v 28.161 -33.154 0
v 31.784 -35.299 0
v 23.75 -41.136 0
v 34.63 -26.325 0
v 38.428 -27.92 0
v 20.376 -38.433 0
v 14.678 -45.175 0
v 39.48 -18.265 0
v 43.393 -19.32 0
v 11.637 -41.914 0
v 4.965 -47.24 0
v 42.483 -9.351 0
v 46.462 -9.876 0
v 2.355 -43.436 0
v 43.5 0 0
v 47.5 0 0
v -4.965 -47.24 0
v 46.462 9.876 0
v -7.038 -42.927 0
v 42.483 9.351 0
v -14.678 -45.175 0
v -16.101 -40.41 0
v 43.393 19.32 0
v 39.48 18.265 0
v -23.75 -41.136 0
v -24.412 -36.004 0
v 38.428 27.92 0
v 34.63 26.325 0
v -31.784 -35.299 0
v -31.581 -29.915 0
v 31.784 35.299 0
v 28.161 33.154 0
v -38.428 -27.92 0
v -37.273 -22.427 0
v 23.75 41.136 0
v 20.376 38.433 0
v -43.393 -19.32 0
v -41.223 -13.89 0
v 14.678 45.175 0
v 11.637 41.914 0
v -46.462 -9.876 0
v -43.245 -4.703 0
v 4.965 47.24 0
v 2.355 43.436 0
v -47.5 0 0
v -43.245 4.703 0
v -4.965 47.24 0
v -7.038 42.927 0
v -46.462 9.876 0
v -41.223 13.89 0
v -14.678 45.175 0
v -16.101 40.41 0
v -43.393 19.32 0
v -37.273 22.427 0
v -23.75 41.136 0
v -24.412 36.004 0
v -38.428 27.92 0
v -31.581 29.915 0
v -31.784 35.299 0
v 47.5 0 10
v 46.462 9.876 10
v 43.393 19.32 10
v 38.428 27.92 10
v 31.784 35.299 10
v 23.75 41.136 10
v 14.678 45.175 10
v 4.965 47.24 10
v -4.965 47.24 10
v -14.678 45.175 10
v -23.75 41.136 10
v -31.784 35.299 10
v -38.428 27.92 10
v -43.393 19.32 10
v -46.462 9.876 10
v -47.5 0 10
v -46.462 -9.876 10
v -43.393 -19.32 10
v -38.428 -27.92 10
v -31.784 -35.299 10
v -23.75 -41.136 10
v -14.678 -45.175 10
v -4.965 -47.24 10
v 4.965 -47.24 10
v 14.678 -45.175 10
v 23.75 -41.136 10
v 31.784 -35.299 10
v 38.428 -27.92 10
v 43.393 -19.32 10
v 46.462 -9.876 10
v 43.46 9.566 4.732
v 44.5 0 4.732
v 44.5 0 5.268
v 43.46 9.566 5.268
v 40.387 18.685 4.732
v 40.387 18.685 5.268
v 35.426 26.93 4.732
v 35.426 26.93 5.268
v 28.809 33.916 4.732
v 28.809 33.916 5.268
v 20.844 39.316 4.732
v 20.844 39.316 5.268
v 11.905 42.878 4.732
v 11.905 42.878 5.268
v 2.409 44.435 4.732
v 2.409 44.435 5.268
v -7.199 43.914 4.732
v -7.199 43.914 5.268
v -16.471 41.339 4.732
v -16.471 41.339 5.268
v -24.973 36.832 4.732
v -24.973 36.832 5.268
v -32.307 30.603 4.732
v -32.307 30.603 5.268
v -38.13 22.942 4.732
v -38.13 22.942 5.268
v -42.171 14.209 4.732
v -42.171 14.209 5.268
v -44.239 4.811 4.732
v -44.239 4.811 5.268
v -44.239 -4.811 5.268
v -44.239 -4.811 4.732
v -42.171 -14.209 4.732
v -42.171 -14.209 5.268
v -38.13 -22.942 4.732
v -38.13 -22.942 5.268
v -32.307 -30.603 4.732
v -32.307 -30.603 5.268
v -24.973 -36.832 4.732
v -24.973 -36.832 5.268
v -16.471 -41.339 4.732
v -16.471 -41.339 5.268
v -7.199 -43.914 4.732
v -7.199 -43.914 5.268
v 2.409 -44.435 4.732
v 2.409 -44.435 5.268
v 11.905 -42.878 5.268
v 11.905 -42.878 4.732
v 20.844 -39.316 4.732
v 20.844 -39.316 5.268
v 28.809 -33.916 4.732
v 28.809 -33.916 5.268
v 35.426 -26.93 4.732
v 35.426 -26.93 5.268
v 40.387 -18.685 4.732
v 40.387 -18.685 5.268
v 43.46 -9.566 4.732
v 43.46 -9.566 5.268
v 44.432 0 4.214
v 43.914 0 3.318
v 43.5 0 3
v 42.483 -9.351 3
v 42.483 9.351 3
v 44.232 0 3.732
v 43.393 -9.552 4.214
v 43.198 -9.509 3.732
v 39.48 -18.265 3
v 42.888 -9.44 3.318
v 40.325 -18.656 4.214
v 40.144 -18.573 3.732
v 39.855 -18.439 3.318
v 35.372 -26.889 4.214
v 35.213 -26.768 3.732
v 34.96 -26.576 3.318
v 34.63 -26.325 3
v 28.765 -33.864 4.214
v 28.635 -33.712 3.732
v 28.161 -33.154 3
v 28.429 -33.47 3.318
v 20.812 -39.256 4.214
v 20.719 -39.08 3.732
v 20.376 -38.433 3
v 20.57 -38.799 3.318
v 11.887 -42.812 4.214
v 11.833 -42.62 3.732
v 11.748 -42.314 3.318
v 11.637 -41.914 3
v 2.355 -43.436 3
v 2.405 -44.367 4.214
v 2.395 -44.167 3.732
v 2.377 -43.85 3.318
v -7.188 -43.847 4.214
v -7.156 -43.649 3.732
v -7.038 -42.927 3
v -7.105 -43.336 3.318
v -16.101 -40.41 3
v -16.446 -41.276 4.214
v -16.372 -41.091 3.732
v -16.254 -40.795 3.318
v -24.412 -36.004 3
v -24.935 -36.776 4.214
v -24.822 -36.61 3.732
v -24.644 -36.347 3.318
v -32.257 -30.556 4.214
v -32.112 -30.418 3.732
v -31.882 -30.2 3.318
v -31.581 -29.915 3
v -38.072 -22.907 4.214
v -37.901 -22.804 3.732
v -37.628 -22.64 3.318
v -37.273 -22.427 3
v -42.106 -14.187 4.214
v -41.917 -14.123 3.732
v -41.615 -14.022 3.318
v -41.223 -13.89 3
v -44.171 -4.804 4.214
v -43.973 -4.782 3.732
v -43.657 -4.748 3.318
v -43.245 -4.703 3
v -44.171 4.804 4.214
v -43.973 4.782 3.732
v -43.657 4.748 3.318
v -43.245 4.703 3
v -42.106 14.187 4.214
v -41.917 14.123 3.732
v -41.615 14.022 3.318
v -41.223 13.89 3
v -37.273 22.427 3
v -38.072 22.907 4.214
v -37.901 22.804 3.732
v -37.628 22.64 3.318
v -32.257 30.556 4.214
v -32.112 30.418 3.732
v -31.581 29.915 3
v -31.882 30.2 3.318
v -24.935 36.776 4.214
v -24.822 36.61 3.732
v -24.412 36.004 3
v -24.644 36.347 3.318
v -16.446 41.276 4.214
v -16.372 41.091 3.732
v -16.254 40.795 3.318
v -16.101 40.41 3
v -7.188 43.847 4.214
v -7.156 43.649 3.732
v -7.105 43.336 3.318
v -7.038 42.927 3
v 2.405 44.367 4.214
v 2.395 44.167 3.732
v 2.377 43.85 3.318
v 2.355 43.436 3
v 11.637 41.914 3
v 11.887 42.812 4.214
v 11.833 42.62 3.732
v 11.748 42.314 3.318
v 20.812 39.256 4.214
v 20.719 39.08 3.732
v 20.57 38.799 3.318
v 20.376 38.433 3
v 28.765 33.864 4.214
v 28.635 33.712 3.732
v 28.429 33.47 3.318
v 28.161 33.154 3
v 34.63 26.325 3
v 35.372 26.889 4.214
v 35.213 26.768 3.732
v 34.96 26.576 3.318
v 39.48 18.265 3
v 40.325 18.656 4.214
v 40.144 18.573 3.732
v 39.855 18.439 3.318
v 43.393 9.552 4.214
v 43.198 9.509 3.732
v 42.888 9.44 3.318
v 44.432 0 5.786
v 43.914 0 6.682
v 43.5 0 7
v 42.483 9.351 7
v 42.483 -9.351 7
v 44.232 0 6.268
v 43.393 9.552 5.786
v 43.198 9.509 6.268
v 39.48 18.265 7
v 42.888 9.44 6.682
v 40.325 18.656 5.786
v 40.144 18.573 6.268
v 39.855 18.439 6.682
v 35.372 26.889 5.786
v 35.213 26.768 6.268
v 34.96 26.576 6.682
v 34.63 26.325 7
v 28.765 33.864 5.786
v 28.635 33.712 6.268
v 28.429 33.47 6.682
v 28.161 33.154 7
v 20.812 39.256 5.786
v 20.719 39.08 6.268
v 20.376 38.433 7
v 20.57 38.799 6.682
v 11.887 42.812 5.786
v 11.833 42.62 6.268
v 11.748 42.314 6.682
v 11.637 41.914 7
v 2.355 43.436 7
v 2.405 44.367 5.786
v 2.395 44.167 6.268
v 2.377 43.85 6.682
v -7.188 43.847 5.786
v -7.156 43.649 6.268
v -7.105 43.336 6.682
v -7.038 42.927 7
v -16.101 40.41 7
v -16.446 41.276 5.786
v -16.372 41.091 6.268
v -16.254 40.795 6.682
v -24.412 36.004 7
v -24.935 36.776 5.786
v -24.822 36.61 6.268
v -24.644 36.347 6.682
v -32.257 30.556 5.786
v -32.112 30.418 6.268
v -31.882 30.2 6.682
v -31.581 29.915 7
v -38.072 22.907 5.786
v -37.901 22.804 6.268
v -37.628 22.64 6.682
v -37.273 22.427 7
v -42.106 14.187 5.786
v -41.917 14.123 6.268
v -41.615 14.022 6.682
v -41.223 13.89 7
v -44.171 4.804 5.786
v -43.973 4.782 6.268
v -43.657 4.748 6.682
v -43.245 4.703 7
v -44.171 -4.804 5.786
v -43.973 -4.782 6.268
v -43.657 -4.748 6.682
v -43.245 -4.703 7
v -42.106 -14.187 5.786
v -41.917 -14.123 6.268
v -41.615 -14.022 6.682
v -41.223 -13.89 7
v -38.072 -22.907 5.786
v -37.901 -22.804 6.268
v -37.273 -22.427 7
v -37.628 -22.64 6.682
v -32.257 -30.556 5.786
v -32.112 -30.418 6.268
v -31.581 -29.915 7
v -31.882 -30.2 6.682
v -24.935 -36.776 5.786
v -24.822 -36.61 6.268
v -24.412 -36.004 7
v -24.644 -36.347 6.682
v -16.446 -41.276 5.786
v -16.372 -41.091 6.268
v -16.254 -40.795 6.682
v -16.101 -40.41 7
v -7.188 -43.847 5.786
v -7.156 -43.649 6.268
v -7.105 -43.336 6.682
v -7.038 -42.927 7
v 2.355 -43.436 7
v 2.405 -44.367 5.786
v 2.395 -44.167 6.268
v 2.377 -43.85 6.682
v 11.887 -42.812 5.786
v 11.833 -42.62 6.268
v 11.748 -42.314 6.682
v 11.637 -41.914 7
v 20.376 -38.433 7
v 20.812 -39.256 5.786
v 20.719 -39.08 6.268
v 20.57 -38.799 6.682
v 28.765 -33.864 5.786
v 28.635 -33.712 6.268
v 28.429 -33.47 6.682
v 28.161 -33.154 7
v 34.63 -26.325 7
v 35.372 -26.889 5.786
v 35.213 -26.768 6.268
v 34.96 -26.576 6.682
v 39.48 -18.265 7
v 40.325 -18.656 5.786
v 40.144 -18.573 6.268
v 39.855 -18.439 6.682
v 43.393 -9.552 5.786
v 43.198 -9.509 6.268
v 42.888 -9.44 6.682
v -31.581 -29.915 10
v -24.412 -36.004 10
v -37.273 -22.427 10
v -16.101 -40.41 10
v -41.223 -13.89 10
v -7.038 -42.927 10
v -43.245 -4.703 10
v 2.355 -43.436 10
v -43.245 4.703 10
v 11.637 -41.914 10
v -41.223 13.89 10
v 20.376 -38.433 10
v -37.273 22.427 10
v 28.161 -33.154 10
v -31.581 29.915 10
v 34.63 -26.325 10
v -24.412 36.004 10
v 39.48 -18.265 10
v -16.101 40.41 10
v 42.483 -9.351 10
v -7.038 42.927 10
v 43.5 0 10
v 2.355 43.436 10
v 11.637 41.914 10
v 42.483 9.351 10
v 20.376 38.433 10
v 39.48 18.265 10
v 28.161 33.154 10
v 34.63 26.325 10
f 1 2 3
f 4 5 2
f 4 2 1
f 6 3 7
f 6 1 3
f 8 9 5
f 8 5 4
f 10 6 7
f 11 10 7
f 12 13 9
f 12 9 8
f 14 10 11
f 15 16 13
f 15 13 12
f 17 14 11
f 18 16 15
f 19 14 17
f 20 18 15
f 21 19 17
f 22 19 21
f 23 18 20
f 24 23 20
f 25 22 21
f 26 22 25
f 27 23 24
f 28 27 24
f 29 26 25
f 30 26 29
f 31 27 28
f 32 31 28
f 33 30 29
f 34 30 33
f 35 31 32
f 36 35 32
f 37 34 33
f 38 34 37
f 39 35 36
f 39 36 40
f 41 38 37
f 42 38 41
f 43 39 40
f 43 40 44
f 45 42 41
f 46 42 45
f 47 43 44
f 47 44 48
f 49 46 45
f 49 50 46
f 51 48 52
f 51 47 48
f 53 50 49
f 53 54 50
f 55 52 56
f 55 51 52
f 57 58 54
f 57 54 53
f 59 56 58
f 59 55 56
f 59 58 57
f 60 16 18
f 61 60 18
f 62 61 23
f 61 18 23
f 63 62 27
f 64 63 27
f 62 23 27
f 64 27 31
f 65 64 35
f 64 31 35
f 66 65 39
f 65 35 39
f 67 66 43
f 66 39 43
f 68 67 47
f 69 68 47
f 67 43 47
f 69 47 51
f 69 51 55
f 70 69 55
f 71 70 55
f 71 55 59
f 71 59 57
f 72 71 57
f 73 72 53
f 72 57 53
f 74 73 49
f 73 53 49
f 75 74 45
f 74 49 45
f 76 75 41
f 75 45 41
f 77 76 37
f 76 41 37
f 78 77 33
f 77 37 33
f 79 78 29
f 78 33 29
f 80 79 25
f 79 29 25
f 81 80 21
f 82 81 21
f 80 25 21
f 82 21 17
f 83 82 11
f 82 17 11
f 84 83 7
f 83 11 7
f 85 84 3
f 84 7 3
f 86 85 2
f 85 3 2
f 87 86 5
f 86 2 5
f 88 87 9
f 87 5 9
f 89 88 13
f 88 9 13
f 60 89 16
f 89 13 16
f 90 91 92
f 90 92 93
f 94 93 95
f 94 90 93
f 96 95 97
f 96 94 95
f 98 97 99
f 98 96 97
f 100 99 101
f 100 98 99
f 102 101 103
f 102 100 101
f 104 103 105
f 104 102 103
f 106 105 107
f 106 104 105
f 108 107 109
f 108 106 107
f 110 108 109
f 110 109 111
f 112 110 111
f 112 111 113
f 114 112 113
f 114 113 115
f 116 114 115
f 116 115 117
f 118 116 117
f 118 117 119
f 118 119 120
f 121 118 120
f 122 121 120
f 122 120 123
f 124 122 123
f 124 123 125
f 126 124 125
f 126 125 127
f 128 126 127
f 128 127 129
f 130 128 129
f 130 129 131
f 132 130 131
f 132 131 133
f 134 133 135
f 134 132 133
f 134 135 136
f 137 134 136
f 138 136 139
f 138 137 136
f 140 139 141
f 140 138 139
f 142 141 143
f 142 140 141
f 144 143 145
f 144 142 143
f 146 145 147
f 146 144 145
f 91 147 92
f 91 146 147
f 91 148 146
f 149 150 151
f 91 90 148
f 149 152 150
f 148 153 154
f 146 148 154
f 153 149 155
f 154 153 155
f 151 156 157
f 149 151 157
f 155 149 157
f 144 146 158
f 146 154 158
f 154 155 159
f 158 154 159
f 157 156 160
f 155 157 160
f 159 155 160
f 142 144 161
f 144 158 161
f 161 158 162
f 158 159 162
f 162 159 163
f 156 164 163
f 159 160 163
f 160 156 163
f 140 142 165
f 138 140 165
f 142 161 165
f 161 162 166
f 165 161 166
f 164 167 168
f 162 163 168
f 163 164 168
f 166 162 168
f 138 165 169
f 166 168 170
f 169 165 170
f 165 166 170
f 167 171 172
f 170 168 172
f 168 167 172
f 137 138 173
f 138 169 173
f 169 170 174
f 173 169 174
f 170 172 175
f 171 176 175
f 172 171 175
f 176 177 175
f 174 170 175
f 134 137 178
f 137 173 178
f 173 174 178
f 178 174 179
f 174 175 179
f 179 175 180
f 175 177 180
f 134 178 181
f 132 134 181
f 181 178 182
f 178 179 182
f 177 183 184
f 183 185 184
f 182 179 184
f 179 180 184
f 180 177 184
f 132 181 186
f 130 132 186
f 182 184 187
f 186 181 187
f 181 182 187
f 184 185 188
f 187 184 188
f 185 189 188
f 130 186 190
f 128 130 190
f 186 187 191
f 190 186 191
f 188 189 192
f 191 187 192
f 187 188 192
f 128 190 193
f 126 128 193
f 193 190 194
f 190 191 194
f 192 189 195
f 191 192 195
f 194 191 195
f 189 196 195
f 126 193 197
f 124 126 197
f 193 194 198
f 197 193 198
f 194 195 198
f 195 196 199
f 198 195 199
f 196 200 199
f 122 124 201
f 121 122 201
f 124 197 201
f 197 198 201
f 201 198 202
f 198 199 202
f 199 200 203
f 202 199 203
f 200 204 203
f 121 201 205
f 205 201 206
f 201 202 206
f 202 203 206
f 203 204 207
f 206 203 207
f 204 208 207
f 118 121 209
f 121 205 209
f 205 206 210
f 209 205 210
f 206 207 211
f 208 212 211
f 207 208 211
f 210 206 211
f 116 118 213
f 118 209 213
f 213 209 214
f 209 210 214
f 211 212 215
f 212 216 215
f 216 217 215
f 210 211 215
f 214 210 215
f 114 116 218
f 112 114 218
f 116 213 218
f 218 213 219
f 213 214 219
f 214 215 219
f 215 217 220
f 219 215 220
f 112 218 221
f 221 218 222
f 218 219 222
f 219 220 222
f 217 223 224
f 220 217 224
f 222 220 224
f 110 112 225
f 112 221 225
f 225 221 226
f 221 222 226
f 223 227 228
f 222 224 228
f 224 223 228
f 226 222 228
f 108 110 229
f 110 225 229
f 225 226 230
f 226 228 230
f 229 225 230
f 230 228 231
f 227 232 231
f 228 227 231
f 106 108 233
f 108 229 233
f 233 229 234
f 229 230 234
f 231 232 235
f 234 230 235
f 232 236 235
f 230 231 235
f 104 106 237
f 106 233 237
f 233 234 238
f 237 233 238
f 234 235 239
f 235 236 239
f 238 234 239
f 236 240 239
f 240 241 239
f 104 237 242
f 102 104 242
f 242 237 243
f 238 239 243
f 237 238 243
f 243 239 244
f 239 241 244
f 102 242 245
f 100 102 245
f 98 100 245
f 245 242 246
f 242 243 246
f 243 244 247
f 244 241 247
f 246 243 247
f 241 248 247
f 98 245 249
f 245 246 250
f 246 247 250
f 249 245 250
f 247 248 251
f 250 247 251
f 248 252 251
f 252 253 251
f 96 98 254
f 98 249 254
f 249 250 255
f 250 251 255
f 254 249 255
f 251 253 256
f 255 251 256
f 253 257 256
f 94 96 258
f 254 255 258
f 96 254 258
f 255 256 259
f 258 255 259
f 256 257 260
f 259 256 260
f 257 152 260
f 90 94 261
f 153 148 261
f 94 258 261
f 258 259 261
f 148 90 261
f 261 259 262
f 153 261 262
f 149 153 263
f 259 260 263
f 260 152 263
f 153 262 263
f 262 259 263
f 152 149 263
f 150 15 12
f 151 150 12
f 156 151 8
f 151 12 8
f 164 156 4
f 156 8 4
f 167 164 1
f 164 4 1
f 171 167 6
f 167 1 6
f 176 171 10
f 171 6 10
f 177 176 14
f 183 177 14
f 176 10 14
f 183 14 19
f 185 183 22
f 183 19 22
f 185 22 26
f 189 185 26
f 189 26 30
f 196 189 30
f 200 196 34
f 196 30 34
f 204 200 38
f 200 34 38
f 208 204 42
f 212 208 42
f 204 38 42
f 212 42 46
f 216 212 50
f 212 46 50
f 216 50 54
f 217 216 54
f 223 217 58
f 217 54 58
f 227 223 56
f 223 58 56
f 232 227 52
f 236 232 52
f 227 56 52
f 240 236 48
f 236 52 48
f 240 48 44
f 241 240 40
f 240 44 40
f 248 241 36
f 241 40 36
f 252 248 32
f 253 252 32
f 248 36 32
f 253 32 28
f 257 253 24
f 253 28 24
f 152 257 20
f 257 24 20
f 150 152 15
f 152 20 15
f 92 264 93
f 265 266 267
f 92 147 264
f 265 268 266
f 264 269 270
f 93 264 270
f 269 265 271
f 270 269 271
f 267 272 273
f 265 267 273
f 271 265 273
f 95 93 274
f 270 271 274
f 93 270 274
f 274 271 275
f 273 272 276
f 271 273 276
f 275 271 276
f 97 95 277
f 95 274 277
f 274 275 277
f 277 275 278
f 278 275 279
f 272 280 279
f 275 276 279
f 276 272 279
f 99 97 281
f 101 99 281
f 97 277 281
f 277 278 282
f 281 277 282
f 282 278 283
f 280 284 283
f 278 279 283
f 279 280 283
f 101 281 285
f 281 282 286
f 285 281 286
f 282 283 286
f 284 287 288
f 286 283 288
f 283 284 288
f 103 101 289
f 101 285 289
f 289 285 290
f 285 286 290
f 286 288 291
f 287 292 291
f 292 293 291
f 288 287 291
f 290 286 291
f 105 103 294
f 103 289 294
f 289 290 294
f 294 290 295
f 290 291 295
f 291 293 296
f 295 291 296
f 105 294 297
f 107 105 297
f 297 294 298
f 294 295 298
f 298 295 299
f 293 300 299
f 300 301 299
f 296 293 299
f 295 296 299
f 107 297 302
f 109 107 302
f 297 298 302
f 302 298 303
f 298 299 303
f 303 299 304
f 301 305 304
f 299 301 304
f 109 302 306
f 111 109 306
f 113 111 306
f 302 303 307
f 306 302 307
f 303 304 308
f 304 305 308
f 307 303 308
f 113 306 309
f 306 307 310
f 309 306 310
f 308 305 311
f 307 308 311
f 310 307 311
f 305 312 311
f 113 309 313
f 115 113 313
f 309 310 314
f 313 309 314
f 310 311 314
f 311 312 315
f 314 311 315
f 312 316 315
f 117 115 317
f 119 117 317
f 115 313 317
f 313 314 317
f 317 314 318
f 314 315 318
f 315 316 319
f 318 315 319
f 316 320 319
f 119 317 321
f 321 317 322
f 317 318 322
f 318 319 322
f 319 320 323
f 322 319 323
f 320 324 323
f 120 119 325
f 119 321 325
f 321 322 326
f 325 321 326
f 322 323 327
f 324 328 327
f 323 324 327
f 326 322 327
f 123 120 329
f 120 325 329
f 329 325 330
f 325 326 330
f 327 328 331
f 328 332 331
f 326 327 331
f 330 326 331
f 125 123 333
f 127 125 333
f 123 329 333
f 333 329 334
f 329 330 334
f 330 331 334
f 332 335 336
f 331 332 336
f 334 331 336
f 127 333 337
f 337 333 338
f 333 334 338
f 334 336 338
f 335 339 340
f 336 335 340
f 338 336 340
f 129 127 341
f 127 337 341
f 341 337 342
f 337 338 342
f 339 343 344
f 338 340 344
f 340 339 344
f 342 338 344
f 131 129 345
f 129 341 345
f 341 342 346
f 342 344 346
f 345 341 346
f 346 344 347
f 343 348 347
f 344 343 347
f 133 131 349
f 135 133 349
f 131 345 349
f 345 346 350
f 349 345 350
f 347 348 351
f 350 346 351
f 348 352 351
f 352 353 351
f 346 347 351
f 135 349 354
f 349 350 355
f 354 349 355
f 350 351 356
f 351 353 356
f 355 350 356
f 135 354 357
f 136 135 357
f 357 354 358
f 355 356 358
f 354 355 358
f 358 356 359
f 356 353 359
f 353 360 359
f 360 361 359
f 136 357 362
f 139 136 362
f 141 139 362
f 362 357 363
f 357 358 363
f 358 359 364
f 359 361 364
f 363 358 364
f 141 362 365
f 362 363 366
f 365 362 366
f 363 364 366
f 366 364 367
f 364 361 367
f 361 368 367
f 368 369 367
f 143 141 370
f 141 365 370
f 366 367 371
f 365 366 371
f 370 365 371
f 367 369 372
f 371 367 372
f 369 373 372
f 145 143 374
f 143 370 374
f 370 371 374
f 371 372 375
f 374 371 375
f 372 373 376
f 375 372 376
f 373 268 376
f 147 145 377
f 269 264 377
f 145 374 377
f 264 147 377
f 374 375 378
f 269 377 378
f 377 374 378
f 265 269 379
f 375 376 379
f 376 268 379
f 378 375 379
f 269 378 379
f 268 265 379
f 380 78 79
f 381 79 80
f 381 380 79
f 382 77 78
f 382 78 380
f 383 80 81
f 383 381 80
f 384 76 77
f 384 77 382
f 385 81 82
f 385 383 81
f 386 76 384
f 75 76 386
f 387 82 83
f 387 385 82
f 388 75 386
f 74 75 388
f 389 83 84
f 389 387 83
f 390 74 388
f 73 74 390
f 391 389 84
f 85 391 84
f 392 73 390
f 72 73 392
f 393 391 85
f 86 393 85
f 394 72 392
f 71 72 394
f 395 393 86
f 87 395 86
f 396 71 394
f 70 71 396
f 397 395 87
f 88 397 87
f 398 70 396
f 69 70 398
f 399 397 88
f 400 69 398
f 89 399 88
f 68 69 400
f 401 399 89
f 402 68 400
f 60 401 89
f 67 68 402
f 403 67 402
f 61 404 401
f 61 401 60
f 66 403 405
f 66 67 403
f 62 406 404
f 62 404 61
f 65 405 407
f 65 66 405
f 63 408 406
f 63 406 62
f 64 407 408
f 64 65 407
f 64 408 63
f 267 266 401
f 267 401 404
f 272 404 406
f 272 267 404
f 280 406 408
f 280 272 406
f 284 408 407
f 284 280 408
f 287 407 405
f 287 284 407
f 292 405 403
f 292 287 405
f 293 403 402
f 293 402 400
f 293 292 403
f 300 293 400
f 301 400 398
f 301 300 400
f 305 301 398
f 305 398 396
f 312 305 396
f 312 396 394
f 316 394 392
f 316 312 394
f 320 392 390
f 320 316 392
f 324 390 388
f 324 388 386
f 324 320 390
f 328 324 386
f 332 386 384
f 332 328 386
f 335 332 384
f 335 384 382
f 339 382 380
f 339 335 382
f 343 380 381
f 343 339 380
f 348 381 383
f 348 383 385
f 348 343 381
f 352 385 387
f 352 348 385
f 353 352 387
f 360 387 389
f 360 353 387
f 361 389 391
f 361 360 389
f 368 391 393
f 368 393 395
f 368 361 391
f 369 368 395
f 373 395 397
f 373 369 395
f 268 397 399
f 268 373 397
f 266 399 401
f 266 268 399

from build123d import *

# Parameters (mm, degrees)
SKETCH_1_R      = 47.5
SKETCH_1_R_2    = 44.5
EXTRUDE_2_DEPTH = 10
EXTRUDE_START   = -3
SKETCH_2_R      = 44.5
SKETCH_2_R_2    = 43.5
EXTRUDE_3_DEPTH = 3
FILLET_1_R      = 2
SKETCH_3_R      = 44.5
SKETCH_3_R_2    = 43.5
EXTRUDE_4_DEPTH = 3
FILLET_2_R      = 2


with BuildPart() as part:
    # 草图1 → 凸台-拉伸2 (new body)
    with BuildSketch(Plane.XY):
        Circle(SKETCH_1_R)
        Circle(SKETCH_1_R_2, mode=Mode.SUBTRACT)
    extrude(amount=EXTRUDE_2_DEPTH)

    # 草图2 → 凸台-拉伸3 (add)
    with BuildSketch(Plane.XY.offset(10).offset(EXTRUDE_START)):
        Circle(SKETCH_2_R)
        Circle(SKETCH_2_R_2, mode=Mode.SUBTRACT)
    extrude(amount=EXTRUDE_3_DEPTH)

    # 圆角1
    # the kernel refuses this fillet: 2 mm, written as the material it adds along each edge
    with BuildSketch(Plane(origin=(0, 0, 7), x_dir=(1, 0, 0), z_dir=(0, -1, 0))) as fillet_1_piece_1:
        with BuildLine():
            CenterArc((42.5, -1.732050808), FILLET_1_R, 0, 60)
            Line((43.5, 0), (43.52, 0.034641016))
            ThreePointArc((43.52, 0.034641016), (44, 0.04), (44.5, 0.04))
            Line((44.5, 0.04), (44.54, 0))
            Line((44.54, 0), (44.54, -1.732050808))
            Line((44.54, -1.732050808), (44.5, -1.732050808))
        make_face()
    revolve(axis=Axis((0, 0, 7), (0, 0, 1)))

    # 草图3 → 凸台-拉伸4 (add)
    with BuildSketch(Plane(origin=(0, 0, 0), x_dir=(-1, 0, 0), z_dir=(0, 0, -1))):
        Circle(SKETCH_3_R)
        with Locations(Location((0, 0, 0), (0, 0, 180))):
            Circle(SKETCH_3_R_2, mode=Mode.SUBTRACT)
    extrude(amount=-EXTRUDE_4_DEPTH)

    # 圆角2
    # the kernel refuses this fillet: 2 mm, written as the material it adds along each edge
    with BuildSketch(Plane(origin=(0, 0, 3), x_dir=(1, 0, 0), z_dir=(0, 1, 0))) as fillet_2_piece_1:
        with BuildLine():
            CenterArc((42.5, -1.732050808), FILLET_2_R, 0, 60)
            Line((43.5, 0), (43.52, 0.034641016))
            ThreePointArc((43.52, 0.034641016), (44, 0.04), (44.5, 0.04))
            Line((44.5, 0.04), (44.54, 0))
            Line((44.54, 0), (44.54, -1.732050808))
            Line((44.54, -1.732050808), (44.5, -1.732050808))
        make_face()
    revolve(axis=Axis((0, 0, 3), (0, 0, -1)))


solid = part.part
